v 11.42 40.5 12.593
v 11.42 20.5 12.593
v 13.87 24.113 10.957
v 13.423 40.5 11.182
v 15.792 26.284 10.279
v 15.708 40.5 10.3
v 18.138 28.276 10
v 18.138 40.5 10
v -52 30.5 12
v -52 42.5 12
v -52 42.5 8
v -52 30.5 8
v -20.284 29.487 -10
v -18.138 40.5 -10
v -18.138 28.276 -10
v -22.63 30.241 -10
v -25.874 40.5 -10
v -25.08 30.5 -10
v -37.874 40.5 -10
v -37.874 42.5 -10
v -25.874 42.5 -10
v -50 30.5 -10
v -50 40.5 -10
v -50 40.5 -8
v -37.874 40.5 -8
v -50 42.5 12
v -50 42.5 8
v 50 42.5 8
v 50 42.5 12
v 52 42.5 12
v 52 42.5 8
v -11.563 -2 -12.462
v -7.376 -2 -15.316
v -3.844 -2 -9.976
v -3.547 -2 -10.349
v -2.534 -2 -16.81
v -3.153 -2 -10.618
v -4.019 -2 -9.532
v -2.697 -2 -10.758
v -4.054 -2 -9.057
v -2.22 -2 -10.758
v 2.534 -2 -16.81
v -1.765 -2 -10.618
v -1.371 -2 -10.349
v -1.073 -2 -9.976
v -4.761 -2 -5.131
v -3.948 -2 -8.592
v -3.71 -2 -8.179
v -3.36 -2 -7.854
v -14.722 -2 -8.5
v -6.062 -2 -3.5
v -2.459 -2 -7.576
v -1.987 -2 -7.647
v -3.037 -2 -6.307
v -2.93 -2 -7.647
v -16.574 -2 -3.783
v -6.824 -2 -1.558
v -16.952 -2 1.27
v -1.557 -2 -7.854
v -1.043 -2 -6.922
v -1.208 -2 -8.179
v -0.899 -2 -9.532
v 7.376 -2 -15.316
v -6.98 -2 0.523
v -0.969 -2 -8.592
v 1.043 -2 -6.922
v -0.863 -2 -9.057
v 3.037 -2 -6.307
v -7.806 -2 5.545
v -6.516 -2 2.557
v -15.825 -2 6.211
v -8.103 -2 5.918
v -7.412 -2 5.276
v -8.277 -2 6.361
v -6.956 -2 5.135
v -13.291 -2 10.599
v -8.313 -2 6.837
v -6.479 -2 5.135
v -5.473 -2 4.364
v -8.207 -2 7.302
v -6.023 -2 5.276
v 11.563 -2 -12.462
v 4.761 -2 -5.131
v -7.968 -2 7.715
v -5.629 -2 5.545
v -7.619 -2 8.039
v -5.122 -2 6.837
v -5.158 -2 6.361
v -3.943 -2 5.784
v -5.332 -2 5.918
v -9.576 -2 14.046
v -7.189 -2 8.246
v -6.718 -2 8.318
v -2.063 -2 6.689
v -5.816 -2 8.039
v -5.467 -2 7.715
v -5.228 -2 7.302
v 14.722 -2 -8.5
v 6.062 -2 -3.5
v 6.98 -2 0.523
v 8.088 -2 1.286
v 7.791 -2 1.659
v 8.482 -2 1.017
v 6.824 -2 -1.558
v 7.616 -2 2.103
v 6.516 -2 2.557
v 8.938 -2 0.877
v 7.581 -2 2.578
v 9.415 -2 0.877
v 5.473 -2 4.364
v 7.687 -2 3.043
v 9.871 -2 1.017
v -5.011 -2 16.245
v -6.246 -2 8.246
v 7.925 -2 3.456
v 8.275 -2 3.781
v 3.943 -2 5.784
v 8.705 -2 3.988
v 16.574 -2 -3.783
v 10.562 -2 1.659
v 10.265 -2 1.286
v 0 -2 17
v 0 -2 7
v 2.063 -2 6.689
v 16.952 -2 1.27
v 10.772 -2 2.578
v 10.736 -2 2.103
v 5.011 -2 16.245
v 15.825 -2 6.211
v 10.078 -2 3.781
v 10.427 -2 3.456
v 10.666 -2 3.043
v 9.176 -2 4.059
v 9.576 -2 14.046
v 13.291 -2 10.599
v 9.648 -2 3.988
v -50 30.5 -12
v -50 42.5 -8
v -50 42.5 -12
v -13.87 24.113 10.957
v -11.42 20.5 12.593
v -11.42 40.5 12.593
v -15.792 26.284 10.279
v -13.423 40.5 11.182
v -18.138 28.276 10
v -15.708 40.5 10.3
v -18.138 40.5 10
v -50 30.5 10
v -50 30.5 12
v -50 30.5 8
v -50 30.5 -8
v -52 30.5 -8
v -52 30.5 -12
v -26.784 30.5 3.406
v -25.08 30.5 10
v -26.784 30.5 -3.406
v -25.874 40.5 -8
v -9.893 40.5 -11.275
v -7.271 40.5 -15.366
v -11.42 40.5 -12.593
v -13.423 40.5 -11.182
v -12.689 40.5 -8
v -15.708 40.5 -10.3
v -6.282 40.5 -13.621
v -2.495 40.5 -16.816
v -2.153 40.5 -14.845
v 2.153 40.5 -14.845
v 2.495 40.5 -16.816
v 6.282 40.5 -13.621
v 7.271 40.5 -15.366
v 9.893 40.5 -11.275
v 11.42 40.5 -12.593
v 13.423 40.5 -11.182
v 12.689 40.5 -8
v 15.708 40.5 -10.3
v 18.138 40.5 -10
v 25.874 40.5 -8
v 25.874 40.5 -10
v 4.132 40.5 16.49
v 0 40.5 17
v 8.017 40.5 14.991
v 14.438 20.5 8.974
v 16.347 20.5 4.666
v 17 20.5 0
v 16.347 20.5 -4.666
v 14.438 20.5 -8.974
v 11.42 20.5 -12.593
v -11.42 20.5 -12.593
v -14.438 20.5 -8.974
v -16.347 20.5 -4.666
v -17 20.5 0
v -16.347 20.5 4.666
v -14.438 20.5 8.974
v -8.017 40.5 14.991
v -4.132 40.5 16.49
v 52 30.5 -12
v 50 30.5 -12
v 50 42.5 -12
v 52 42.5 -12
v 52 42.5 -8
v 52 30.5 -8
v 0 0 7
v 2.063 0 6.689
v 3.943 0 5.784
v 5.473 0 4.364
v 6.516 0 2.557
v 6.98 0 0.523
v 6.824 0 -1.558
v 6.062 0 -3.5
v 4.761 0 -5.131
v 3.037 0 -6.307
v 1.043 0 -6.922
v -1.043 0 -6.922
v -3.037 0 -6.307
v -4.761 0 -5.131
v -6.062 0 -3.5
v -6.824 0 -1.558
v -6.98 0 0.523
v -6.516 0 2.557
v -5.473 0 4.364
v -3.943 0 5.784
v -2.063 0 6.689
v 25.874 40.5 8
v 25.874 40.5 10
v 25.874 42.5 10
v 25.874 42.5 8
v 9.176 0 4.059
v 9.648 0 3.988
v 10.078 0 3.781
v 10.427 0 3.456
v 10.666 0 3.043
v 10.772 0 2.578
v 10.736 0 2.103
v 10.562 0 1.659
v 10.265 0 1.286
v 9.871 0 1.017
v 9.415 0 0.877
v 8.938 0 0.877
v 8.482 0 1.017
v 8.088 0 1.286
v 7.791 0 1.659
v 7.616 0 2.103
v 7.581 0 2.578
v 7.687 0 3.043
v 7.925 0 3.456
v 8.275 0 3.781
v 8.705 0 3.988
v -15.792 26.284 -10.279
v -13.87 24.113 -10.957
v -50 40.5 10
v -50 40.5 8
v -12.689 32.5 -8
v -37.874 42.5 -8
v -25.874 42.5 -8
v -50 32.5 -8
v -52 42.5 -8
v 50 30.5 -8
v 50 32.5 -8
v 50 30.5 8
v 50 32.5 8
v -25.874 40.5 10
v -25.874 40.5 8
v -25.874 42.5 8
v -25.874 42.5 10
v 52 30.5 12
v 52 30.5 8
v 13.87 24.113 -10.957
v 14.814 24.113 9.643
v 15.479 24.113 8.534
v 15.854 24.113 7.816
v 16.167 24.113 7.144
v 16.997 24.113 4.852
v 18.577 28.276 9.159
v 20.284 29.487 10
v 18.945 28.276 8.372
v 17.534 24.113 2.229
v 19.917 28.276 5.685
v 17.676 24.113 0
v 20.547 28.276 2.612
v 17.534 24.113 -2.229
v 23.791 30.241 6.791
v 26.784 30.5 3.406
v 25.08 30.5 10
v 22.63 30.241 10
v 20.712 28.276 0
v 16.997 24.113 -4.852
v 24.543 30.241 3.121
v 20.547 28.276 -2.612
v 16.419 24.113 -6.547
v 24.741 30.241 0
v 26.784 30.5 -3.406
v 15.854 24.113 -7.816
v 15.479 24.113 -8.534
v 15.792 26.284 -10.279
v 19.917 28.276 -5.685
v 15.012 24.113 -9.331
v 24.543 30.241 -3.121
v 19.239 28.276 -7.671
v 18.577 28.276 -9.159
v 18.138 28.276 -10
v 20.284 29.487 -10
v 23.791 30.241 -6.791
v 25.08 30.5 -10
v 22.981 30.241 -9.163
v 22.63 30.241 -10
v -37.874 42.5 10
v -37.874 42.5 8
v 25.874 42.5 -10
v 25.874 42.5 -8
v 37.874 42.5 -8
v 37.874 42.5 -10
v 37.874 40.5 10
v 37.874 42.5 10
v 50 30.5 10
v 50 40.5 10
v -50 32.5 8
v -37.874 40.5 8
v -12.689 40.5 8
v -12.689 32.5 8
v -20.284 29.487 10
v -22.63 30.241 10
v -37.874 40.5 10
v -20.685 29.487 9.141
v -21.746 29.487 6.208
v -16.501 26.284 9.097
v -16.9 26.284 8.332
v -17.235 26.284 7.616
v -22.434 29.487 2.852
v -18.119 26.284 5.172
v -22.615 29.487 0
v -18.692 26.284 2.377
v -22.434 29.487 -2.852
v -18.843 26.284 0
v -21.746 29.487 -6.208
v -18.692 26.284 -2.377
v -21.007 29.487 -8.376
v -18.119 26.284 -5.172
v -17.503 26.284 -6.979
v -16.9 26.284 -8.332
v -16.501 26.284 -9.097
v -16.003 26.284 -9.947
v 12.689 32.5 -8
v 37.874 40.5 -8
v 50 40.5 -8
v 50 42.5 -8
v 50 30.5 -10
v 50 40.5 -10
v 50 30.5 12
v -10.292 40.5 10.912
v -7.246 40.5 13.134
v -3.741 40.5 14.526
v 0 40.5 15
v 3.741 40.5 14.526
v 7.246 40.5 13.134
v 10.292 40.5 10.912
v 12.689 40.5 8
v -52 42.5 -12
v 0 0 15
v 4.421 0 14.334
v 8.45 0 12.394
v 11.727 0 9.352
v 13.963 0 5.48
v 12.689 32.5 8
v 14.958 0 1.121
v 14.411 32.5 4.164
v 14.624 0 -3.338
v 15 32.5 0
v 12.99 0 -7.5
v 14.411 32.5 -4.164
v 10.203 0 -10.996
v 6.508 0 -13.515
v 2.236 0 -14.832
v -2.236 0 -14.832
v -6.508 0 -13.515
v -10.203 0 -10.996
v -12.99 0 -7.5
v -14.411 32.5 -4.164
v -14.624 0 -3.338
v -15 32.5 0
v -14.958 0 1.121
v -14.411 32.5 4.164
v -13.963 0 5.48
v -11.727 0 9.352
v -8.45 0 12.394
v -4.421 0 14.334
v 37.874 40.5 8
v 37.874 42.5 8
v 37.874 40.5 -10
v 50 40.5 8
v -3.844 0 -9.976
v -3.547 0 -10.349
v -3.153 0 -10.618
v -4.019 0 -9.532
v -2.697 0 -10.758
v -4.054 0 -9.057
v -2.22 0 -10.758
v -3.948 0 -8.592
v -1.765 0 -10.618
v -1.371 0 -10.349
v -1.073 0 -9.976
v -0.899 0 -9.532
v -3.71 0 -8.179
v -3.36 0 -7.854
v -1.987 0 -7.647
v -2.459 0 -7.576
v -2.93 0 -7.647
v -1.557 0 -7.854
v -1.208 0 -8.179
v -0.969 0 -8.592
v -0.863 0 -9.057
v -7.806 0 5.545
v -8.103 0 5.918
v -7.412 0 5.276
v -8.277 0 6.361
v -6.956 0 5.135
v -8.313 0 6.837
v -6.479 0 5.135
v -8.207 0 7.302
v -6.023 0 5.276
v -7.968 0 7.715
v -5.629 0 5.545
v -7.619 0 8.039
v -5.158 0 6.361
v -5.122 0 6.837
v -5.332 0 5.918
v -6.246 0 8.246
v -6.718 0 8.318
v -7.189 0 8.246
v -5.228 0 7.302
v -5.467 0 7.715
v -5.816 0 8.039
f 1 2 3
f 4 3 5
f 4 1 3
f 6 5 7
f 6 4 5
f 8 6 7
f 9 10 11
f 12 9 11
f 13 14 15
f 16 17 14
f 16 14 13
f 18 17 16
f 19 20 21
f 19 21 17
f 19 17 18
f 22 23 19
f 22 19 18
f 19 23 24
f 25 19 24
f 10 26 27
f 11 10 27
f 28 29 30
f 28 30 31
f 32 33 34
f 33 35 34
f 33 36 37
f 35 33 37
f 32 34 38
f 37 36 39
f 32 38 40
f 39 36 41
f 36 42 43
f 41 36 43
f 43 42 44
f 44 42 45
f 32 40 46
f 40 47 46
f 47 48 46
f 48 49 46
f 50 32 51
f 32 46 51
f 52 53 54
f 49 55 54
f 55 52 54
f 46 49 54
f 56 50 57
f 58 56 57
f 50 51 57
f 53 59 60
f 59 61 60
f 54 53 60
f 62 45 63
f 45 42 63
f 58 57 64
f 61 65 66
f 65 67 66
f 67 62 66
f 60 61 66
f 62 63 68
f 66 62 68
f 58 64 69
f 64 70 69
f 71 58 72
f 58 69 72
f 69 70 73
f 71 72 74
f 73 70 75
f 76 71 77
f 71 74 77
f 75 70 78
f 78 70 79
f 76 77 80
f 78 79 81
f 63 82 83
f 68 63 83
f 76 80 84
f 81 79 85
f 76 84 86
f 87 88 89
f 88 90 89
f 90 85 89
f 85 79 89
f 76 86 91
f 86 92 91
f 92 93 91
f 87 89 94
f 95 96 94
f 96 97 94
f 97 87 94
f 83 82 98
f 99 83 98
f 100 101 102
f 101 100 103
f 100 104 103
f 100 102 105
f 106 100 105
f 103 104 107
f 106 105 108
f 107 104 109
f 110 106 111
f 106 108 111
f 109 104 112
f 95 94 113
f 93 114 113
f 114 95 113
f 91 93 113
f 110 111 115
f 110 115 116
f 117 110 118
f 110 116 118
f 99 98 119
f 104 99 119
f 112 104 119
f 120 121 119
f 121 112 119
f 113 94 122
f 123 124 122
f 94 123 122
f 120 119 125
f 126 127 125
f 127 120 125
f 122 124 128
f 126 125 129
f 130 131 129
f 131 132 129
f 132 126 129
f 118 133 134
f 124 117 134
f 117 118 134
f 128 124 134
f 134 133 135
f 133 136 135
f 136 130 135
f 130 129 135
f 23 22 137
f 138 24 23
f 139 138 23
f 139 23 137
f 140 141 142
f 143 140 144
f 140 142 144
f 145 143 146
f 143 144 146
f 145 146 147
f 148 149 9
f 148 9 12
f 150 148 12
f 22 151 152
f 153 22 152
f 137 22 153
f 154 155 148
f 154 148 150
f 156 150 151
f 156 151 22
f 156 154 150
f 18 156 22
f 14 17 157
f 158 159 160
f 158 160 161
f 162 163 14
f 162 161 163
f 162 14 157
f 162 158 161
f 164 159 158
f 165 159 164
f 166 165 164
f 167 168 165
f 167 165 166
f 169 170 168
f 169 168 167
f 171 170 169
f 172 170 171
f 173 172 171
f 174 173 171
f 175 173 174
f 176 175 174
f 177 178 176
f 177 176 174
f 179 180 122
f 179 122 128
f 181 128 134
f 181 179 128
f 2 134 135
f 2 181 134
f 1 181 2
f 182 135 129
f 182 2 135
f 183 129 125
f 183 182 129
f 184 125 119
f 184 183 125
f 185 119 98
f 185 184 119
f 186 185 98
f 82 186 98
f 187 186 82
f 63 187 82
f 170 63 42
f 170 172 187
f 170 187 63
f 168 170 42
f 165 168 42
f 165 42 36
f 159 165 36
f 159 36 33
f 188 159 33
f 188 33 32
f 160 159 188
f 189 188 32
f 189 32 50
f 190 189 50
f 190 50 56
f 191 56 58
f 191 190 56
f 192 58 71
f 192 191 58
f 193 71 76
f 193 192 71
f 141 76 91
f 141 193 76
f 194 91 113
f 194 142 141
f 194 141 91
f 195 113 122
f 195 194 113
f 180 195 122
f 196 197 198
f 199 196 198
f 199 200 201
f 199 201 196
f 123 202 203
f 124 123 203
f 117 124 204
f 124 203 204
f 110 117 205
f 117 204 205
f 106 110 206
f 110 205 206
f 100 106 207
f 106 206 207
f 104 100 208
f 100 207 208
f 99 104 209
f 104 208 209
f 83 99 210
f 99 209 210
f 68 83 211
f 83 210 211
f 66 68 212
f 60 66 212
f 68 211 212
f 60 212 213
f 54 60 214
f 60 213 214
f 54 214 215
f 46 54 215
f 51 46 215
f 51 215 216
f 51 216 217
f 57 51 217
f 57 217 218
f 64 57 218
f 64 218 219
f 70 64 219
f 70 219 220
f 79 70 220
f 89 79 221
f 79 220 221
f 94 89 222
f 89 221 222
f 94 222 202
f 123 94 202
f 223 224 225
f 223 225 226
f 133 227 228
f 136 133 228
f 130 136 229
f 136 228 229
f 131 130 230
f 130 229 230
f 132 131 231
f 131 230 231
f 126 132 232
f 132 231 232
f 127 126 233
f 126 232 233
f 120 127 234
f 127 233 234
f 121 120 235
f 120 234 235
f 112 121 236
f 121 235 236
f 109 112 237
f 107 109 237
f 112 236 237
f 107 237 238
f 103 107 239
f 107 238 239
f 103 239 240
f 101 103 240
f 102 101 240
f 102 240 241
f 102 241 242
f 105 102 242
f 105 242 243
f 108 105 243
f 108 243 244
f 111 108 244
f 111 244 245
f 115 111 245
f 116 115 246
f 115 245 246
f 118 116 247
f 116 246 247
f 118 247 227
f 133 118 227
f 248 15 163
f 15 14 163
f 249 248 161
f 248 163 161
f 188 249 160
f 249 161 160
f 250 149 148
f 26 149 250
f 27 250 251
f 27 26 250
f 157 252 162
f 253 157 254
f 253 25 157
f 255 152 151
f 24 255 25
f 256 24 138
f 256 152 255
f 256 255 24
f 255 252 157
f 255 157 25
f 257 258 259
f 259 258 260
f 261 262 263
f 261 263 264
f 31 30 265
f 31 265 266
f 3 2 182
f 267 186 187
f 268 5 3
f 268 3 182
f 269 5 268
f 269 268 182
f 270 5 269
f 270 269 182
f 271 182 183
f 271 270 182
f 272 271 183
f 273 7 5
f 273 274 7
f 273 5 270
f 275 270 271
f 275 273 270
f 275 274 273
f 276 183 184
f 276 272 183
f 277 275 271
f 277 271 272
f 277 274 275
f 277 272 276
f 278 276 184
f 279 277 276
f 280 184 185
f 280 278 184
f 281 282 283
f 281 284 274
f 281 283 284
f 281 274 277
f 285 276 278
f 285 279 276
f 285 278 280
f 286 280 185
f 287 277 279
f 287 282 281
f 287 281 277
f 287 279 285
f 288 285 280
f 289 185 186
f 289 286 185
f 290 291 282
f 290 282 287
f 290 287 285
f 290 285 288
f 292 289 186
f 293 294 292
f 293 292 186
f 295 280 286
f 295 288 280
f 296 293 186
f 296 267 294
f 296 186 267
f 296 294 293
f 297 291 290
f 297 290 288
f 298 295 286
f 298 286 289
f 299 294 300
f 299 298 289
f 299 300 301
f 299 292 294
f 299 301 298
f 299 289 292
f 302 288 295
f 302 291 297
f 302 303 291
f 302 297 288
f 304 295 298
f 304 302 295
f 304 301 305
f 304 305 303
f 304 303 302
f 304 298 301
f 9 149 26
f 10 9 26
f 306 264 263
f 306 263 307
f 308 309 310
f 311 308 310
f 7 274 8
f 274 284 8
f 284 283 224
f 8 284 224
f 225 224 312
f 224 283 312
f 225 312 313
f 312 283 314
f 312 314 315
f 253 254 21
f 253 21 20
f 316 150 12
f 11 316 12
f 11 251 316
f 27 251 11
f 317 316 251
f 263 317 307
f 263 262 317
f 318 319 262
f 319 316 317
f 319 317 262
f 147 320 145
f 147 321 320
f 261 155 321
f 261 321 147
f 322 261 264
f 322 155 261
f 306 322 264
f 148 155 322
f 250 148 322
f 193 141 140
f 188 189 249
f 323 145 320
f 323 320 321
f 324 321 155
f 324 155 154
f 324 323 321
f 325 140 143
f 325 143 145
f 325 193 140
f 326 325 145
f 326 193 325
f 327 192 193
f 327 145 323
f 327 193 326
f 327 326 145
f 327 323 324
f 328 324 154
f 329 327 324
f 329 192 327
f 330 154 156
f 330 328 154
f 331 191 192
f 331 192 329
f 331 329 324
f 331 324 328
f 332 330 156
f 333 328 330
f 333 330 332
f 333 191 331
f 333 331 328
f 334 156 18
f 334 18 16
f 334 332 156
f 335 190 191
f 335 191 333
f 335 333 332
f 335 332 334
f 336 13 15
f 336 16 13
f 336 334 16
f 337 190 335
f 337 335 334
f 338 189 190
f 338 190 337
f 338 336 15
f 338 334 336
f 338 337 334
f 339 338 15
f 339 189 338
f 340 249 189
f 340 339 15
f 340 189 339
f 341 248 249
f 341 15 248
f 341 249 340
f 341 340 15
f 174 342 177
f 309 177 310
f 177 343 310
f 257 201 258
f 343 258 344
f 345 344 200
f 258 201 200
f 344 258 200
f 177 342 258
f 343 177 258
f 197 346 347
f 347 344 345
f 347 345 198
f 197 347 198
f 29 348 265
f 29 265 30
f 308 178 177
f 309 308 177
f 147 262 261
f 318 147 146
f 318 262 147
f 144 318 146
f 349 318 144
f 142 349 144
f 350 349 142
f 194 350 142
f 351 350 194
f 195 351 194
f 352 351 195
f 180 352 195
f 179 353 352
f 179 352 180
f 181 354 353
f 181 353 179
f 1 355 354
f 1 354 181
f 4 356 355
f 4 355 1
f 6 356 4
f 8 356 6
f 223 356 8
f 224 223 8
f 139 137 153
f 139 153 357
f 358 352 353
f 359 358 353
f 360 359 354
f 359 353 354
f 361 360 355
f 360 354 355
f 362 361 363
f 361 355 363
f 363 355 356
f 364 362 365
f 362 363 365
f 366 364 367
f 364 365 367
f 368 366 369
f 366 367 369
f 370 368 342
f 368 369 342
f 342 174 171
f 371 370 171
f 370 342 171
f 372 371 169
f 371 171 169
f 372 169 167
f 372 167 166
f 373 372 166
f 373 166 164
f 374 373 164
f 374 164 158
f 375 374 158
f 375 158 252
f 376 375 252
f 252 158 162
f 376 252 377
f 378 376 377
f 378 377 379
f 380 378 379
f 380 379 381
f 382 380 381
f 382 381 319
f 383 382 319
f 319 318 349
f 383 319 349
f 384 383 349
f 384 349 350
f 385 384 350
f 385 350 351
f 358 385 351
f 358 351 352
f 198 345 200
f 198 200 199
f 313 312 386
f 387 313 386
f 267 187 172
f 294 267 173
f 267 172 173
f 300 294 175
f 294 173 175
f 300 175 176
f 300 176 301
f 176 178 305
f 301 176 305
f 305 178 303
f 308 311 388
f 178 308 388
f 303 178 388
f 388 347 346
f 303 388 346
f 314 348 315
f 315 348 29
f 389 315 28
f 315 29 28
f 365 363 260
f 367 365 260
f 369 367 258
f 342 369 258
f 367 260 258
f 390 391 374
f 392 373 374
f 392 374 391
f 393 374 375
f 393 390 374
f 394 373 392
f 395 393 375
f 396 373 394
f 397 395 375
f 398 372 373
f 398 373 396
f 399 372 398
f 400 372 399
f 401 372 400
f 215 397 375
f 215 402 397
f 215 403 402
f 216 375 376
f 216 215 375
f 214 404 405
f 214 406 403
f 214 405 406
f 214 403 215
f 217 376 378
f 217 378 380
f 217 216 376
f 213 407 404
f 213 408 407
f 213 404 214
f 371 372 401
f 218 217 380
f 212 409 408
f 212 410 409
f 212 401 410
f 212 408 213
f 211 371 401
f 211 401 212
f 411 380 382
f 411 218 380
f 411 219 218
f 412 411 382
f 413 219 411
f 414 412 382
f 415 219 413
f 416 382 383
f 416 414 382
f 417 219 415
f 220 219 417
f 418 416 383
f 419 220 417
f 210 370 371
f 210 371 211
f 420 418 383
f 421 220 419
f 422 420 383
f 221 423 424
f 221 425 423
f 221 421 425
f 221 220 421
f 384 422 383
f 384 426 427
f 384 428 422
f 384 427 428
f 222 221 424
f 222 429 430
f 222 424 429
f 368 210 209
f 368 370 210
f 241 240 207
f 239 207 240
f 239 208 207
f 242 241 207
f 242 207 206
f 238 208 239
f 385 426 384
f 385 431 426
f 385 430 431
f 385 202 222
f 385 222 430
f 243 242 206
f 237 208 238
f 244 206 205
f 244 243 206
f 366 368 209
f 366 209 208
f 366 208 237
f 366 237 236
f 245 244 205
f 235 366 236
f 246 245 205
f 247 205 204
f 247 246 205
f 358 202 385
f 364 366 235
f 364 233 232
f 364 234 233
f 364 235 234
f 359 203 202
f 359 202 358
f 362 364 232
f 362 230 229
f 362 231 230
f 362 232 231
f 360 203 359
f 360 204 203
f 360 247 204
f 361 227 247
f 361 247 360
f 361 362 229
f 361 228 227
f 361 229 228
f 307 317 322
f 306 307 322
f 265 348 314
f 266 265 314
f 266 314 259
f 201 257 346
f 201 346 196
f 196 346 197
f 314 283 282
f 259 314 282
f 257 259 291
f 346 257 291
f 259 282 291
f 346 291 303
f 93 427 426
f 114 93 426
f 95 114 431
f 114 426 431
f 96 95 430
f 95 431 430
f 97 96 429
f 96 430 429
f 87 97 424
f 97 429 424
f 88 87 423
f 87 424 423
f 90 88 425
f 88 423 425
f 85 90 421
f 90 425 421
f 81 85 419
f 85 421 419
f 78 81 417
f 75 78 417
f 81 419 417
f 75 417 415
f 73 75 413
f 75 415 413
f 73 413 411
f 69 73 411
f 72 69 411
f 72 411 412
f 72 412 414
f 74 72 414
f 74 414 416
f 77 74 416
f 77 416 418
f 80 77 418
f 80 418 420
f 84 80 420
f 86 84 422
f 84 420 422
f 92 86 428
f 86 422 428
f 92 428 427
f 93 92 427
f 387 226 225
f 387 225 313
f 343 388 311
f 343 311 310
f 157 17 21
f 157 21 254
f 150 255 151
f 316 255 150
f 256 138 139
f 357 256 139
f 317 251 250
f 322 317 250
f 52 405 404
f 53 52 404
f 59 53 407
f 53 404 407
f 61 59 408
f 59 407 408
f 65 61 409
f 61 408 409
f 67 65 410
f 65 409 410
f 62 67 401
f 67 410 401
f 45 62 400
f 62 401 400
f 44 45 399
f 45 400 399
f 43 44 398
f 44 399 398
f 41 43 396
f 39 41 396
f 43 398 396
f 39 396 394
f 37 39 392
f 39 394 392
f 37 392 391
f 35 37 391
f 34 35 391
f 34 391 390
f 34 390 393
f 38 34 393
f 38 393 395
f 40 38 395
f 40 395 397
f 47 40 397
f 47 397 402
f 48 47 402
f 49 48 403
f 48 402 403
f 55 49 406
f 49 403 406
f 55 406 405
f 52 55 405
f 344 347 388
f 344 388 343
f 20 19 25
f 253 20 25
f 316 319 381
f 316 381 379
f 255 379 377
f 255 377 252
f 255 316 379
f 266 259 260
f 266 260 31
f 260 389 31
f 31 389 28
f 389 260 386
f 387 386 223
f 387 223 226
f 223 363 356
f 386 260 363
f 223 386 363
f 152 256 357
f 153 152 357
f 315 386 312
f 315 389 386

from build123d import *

# Parameters (mm, degrees)
SKETCH_1_R               = 17
SKETCH_1_R_2             = 7
SKETCH_1_R_3             = 1.6
EXTRUDE_1_DEPTH          = 2
EXTRUDE_START            = 40.5
SKETCH_2_R               = 17
SKETCH_2_R_2             = 15
EXTRUDE_2_DEPTH          = 40.5
EXTRUDE_3_REACH          = 82.114
EXTRUDE_3_END_RADIUS     = 17
SKETCH_5_W               = 4
SKETCH_5_H               = 12
EXTRUDE_4_DEPTH          = 2
CUT_EXTRUDE_1_REACH      = 83.143
SKETCH_6_W               = 16
SKETCH_6_H               = 8
SKETCH_7_W               = 12
SKETCH_7_H               = 2
EXTRUDE_5_DEPTH          = 2
MIRROR_2_COPY_1_SKETCH_W = 12
MIRROR_2_COPY_1_SKETCH_H = 2
MIRROR_2_COPY_1_DEPTH    = 2
MIRROR_2_COPY_2_SKETCH_W = 12
MIRROR_2_COPY_2_SKETCH_H = 2
MIRROR_2_COPY_2_DEPTH    = 2
FILLET_1_R               = 10


with BuildPart() as part:
    # 草图1 → 凸台-拉伸1 (new body)
    with BuildSketch(Plane(origin=(0, 0, 0), x_dir=(1, 0, 0), z_dir=(0, 1, 0))):
        with Locations(Location((0, 0, 0), (0, 0, 270))):
            Circle(SKETCH_1_R)
        with Locations(Location((0, 0, 0), (0, 0, 270))):
            Circle(SKETCH_1_R_2, mode=Mode.SUBTRACT)
        with Locations(Location((9.17629535, -2.458780928, 0), (0, 0, 270))):
            Circle(SKETCH_1_R_3, mode=Mode.SUBTRACT)
        with Locations(Location((-6.717514421, -6.717514421, 0), (0, 0, 270))):
            Circle(SKETCH_1_R_3, mode=Mode.SUBTRACT)
        with Locations(Location((-2.458780928, 9.17629535, 0), (0, 0, 270))):
            Circle(SKETCH_1_R_3, mode=Mode.SUBTRACT)
    extrude(amount=-EXTRUDE_1_DEPTH)

    # 草图2 → 凸台-拉伸2 (add)
    with BuildSketch(Plane(origin=(0, 0, 0), x_dir=(1, 0, 0), z_dir=(0, 1, 0)).offset(EXTRUDE_START)):
        with Locations(Location((0, 0, 0), (0, 0, 270))):
            Circle(SKETCH_2_R)
        with Locations(Location((0, 0, 0), (0, 0, 270))):
            Circle(SKETCH_2_R_2, mode=Mode.SUBTRACT)
    extrude(amount=-EXTRUDE_2_DEPTH)

    # 凸台-拉伸3: up to this cylinder (the profile starts outside it)
    extrude_3_end = Plane(origin=(0, 40.276393, 0), z_dir=(0, 1, 0)) * Cylinder(EXTRUDE_3_END_RADIUS, 199.228, mode=Mode.PRIVATE)
    # 草图4 → 凸台-拉伸3 (add, up to the surface)
    with BuildSketch(Plane(origin=(50, 0, 0), x_dir=(0, 0, -1), z_dir=(1, 0, 0)), mode=Mode.PRIVATE) as extrude_3_sk1:
        Polygon((-10, 40.5), (-8, 40.5), (-8, 32.5), (8, 32.5), (8, 40.5), (10, 40.5), (10, 30.5), (-10, 30.5), align=None)
    extrude_3_tool1 = extrude(extrude_3_sk1.sketch, amount=-EXTRUDE_3_REACH, mode=Mode.PRIVATE) - extrude_3_end
    extrude_3 = extrude_3_tool1.solids().sort_by_distance((50, 40.276393, 9))[0]
    add(extrude_3)

    # 草图5 → 凸台-拉伸4 (add)
    with BuildSketch(Plane(origin=(50, 0, 0), x_dir=(0, 0, -1), z_dir=(1, 0, 0))):
        with Locations((-10, 36.5)):
            Rectangle(SKETCH_5_W, SKETCH_5_H)
        with Locations((10, 36.5)):
            Rectangle(SKETCH_5_W, SKETCH_5_H)
    extrude_4 = extrude(amount=EXTRUDE_4_DEPTH)

    # 草图6 → 切除-拉伸1 (cut, up to next)
    with BuildSketch(Plane(origin=(50, 0, 0), x_dir=(0, 0, -1), z_dir=(1, 0, 0)), mode=Mode.PRIVATE) as cut_extrude_1_sk1:
        with Locations((0, 36.5)):
            Rectangle(SKETCH_6_W, SKETCH_6_H)
    cut_extrude_1_tool1 = extrude(cut_extrude_1_sk1.sketch, amount=-CUT_EXTRUDE_1_REACH, mode=Mode.PRIVATE) & part.part
    cut_extrude_1 = cut_extrude_1_tool1.solids().sort_by_distance((50, 36.5, 0))[0]
    add(cut_extrude_1, mode=Mode.SUBTRACT)

    # 草图7 → 凸台-拉伸5 (add)
    with BuildSketch(Plane(origin=(0, 40.5, 0), x_dir=(1, 0, 0), z_dir=(0, 1, 0))):
        with Locations((31.873863542, -9)):
            Rectangle(SKETCH_7_W, SKETCH_7_H)
    extrude_5 = extrude(amount=EXTRUDE_5_DEPTH)

    # 镜向1: 凸台-拉伸5 across plane
    add(extrude_5.mirror(Plane.XY))

    # 镜向2: 凸台-拉伸3, 凸台-拉伸4, 切除-拉伸1 across plane
    add(extrude_3.mirror(Plane(origin=(0, 0, 0), x_dir=(0, 0, 1), z_dir=(1, 0, 0))))
    add(extrude_4.mirror(Plane(origin=(0, 0, 0), x_dir=(0, 0, 1), z_dir=(1, 0, 0))))
    add(cut_extrude_1.mirror(Plane(origin=(0, 0, 0), x_dir=(0, 0, 1), z_dir=(1, 0, 0))), mode=Mode.SUBTRACT)

    # 镜向2 copy 1 sketch → 镜向2 copy 1 (add)
    with BuildSketch(Plane(origin=(0, 40.5, 0), x_dir=(-1, 0, 0), z_dir=(0, 1, 0))):
        with Locations((31.873863542, -9)):
            Rectangle(MIRROR_2_COPY_1_SKETCH_W, MIRROR_2_COPY_1_SKETCH_H)
    extrude(amount=MIRROR_2_COPY_1_DEPTH)

    # 镜向2 copy 2 sketch → 镜向2 copy 2 (add)
    with BuildSketch(Plane(origin=(0, 40.5, 0), x_dir=(-1, 0, 0), z_dir=(0, 1, 0))):
        with Locations((31.873863542, 9)):
            Rectangle(MIRROR_2_COPY_2_SKETCH_W, MIRROR_2_COPY_2_SKETCH_H)
    extrude(amount=MIRROR_2_COPY_2_DEPTH)

    # 圆角1
    fillet_1_edges = [part.edges().sort_by_distance(p)[0] for p in [
        (-13.747727085, 35.5, 10),
        (-13.747727085, 35.5, -10),
        (-17, 30.5, 0),
        (13.747727085, 35.5, 10),
        (13.747727085, 35.5, -10),
        (17, 30.5, 0),
    ]]
    fillet(fillet_1_edges, radius=FILLET_1_R)


solid = part.part
